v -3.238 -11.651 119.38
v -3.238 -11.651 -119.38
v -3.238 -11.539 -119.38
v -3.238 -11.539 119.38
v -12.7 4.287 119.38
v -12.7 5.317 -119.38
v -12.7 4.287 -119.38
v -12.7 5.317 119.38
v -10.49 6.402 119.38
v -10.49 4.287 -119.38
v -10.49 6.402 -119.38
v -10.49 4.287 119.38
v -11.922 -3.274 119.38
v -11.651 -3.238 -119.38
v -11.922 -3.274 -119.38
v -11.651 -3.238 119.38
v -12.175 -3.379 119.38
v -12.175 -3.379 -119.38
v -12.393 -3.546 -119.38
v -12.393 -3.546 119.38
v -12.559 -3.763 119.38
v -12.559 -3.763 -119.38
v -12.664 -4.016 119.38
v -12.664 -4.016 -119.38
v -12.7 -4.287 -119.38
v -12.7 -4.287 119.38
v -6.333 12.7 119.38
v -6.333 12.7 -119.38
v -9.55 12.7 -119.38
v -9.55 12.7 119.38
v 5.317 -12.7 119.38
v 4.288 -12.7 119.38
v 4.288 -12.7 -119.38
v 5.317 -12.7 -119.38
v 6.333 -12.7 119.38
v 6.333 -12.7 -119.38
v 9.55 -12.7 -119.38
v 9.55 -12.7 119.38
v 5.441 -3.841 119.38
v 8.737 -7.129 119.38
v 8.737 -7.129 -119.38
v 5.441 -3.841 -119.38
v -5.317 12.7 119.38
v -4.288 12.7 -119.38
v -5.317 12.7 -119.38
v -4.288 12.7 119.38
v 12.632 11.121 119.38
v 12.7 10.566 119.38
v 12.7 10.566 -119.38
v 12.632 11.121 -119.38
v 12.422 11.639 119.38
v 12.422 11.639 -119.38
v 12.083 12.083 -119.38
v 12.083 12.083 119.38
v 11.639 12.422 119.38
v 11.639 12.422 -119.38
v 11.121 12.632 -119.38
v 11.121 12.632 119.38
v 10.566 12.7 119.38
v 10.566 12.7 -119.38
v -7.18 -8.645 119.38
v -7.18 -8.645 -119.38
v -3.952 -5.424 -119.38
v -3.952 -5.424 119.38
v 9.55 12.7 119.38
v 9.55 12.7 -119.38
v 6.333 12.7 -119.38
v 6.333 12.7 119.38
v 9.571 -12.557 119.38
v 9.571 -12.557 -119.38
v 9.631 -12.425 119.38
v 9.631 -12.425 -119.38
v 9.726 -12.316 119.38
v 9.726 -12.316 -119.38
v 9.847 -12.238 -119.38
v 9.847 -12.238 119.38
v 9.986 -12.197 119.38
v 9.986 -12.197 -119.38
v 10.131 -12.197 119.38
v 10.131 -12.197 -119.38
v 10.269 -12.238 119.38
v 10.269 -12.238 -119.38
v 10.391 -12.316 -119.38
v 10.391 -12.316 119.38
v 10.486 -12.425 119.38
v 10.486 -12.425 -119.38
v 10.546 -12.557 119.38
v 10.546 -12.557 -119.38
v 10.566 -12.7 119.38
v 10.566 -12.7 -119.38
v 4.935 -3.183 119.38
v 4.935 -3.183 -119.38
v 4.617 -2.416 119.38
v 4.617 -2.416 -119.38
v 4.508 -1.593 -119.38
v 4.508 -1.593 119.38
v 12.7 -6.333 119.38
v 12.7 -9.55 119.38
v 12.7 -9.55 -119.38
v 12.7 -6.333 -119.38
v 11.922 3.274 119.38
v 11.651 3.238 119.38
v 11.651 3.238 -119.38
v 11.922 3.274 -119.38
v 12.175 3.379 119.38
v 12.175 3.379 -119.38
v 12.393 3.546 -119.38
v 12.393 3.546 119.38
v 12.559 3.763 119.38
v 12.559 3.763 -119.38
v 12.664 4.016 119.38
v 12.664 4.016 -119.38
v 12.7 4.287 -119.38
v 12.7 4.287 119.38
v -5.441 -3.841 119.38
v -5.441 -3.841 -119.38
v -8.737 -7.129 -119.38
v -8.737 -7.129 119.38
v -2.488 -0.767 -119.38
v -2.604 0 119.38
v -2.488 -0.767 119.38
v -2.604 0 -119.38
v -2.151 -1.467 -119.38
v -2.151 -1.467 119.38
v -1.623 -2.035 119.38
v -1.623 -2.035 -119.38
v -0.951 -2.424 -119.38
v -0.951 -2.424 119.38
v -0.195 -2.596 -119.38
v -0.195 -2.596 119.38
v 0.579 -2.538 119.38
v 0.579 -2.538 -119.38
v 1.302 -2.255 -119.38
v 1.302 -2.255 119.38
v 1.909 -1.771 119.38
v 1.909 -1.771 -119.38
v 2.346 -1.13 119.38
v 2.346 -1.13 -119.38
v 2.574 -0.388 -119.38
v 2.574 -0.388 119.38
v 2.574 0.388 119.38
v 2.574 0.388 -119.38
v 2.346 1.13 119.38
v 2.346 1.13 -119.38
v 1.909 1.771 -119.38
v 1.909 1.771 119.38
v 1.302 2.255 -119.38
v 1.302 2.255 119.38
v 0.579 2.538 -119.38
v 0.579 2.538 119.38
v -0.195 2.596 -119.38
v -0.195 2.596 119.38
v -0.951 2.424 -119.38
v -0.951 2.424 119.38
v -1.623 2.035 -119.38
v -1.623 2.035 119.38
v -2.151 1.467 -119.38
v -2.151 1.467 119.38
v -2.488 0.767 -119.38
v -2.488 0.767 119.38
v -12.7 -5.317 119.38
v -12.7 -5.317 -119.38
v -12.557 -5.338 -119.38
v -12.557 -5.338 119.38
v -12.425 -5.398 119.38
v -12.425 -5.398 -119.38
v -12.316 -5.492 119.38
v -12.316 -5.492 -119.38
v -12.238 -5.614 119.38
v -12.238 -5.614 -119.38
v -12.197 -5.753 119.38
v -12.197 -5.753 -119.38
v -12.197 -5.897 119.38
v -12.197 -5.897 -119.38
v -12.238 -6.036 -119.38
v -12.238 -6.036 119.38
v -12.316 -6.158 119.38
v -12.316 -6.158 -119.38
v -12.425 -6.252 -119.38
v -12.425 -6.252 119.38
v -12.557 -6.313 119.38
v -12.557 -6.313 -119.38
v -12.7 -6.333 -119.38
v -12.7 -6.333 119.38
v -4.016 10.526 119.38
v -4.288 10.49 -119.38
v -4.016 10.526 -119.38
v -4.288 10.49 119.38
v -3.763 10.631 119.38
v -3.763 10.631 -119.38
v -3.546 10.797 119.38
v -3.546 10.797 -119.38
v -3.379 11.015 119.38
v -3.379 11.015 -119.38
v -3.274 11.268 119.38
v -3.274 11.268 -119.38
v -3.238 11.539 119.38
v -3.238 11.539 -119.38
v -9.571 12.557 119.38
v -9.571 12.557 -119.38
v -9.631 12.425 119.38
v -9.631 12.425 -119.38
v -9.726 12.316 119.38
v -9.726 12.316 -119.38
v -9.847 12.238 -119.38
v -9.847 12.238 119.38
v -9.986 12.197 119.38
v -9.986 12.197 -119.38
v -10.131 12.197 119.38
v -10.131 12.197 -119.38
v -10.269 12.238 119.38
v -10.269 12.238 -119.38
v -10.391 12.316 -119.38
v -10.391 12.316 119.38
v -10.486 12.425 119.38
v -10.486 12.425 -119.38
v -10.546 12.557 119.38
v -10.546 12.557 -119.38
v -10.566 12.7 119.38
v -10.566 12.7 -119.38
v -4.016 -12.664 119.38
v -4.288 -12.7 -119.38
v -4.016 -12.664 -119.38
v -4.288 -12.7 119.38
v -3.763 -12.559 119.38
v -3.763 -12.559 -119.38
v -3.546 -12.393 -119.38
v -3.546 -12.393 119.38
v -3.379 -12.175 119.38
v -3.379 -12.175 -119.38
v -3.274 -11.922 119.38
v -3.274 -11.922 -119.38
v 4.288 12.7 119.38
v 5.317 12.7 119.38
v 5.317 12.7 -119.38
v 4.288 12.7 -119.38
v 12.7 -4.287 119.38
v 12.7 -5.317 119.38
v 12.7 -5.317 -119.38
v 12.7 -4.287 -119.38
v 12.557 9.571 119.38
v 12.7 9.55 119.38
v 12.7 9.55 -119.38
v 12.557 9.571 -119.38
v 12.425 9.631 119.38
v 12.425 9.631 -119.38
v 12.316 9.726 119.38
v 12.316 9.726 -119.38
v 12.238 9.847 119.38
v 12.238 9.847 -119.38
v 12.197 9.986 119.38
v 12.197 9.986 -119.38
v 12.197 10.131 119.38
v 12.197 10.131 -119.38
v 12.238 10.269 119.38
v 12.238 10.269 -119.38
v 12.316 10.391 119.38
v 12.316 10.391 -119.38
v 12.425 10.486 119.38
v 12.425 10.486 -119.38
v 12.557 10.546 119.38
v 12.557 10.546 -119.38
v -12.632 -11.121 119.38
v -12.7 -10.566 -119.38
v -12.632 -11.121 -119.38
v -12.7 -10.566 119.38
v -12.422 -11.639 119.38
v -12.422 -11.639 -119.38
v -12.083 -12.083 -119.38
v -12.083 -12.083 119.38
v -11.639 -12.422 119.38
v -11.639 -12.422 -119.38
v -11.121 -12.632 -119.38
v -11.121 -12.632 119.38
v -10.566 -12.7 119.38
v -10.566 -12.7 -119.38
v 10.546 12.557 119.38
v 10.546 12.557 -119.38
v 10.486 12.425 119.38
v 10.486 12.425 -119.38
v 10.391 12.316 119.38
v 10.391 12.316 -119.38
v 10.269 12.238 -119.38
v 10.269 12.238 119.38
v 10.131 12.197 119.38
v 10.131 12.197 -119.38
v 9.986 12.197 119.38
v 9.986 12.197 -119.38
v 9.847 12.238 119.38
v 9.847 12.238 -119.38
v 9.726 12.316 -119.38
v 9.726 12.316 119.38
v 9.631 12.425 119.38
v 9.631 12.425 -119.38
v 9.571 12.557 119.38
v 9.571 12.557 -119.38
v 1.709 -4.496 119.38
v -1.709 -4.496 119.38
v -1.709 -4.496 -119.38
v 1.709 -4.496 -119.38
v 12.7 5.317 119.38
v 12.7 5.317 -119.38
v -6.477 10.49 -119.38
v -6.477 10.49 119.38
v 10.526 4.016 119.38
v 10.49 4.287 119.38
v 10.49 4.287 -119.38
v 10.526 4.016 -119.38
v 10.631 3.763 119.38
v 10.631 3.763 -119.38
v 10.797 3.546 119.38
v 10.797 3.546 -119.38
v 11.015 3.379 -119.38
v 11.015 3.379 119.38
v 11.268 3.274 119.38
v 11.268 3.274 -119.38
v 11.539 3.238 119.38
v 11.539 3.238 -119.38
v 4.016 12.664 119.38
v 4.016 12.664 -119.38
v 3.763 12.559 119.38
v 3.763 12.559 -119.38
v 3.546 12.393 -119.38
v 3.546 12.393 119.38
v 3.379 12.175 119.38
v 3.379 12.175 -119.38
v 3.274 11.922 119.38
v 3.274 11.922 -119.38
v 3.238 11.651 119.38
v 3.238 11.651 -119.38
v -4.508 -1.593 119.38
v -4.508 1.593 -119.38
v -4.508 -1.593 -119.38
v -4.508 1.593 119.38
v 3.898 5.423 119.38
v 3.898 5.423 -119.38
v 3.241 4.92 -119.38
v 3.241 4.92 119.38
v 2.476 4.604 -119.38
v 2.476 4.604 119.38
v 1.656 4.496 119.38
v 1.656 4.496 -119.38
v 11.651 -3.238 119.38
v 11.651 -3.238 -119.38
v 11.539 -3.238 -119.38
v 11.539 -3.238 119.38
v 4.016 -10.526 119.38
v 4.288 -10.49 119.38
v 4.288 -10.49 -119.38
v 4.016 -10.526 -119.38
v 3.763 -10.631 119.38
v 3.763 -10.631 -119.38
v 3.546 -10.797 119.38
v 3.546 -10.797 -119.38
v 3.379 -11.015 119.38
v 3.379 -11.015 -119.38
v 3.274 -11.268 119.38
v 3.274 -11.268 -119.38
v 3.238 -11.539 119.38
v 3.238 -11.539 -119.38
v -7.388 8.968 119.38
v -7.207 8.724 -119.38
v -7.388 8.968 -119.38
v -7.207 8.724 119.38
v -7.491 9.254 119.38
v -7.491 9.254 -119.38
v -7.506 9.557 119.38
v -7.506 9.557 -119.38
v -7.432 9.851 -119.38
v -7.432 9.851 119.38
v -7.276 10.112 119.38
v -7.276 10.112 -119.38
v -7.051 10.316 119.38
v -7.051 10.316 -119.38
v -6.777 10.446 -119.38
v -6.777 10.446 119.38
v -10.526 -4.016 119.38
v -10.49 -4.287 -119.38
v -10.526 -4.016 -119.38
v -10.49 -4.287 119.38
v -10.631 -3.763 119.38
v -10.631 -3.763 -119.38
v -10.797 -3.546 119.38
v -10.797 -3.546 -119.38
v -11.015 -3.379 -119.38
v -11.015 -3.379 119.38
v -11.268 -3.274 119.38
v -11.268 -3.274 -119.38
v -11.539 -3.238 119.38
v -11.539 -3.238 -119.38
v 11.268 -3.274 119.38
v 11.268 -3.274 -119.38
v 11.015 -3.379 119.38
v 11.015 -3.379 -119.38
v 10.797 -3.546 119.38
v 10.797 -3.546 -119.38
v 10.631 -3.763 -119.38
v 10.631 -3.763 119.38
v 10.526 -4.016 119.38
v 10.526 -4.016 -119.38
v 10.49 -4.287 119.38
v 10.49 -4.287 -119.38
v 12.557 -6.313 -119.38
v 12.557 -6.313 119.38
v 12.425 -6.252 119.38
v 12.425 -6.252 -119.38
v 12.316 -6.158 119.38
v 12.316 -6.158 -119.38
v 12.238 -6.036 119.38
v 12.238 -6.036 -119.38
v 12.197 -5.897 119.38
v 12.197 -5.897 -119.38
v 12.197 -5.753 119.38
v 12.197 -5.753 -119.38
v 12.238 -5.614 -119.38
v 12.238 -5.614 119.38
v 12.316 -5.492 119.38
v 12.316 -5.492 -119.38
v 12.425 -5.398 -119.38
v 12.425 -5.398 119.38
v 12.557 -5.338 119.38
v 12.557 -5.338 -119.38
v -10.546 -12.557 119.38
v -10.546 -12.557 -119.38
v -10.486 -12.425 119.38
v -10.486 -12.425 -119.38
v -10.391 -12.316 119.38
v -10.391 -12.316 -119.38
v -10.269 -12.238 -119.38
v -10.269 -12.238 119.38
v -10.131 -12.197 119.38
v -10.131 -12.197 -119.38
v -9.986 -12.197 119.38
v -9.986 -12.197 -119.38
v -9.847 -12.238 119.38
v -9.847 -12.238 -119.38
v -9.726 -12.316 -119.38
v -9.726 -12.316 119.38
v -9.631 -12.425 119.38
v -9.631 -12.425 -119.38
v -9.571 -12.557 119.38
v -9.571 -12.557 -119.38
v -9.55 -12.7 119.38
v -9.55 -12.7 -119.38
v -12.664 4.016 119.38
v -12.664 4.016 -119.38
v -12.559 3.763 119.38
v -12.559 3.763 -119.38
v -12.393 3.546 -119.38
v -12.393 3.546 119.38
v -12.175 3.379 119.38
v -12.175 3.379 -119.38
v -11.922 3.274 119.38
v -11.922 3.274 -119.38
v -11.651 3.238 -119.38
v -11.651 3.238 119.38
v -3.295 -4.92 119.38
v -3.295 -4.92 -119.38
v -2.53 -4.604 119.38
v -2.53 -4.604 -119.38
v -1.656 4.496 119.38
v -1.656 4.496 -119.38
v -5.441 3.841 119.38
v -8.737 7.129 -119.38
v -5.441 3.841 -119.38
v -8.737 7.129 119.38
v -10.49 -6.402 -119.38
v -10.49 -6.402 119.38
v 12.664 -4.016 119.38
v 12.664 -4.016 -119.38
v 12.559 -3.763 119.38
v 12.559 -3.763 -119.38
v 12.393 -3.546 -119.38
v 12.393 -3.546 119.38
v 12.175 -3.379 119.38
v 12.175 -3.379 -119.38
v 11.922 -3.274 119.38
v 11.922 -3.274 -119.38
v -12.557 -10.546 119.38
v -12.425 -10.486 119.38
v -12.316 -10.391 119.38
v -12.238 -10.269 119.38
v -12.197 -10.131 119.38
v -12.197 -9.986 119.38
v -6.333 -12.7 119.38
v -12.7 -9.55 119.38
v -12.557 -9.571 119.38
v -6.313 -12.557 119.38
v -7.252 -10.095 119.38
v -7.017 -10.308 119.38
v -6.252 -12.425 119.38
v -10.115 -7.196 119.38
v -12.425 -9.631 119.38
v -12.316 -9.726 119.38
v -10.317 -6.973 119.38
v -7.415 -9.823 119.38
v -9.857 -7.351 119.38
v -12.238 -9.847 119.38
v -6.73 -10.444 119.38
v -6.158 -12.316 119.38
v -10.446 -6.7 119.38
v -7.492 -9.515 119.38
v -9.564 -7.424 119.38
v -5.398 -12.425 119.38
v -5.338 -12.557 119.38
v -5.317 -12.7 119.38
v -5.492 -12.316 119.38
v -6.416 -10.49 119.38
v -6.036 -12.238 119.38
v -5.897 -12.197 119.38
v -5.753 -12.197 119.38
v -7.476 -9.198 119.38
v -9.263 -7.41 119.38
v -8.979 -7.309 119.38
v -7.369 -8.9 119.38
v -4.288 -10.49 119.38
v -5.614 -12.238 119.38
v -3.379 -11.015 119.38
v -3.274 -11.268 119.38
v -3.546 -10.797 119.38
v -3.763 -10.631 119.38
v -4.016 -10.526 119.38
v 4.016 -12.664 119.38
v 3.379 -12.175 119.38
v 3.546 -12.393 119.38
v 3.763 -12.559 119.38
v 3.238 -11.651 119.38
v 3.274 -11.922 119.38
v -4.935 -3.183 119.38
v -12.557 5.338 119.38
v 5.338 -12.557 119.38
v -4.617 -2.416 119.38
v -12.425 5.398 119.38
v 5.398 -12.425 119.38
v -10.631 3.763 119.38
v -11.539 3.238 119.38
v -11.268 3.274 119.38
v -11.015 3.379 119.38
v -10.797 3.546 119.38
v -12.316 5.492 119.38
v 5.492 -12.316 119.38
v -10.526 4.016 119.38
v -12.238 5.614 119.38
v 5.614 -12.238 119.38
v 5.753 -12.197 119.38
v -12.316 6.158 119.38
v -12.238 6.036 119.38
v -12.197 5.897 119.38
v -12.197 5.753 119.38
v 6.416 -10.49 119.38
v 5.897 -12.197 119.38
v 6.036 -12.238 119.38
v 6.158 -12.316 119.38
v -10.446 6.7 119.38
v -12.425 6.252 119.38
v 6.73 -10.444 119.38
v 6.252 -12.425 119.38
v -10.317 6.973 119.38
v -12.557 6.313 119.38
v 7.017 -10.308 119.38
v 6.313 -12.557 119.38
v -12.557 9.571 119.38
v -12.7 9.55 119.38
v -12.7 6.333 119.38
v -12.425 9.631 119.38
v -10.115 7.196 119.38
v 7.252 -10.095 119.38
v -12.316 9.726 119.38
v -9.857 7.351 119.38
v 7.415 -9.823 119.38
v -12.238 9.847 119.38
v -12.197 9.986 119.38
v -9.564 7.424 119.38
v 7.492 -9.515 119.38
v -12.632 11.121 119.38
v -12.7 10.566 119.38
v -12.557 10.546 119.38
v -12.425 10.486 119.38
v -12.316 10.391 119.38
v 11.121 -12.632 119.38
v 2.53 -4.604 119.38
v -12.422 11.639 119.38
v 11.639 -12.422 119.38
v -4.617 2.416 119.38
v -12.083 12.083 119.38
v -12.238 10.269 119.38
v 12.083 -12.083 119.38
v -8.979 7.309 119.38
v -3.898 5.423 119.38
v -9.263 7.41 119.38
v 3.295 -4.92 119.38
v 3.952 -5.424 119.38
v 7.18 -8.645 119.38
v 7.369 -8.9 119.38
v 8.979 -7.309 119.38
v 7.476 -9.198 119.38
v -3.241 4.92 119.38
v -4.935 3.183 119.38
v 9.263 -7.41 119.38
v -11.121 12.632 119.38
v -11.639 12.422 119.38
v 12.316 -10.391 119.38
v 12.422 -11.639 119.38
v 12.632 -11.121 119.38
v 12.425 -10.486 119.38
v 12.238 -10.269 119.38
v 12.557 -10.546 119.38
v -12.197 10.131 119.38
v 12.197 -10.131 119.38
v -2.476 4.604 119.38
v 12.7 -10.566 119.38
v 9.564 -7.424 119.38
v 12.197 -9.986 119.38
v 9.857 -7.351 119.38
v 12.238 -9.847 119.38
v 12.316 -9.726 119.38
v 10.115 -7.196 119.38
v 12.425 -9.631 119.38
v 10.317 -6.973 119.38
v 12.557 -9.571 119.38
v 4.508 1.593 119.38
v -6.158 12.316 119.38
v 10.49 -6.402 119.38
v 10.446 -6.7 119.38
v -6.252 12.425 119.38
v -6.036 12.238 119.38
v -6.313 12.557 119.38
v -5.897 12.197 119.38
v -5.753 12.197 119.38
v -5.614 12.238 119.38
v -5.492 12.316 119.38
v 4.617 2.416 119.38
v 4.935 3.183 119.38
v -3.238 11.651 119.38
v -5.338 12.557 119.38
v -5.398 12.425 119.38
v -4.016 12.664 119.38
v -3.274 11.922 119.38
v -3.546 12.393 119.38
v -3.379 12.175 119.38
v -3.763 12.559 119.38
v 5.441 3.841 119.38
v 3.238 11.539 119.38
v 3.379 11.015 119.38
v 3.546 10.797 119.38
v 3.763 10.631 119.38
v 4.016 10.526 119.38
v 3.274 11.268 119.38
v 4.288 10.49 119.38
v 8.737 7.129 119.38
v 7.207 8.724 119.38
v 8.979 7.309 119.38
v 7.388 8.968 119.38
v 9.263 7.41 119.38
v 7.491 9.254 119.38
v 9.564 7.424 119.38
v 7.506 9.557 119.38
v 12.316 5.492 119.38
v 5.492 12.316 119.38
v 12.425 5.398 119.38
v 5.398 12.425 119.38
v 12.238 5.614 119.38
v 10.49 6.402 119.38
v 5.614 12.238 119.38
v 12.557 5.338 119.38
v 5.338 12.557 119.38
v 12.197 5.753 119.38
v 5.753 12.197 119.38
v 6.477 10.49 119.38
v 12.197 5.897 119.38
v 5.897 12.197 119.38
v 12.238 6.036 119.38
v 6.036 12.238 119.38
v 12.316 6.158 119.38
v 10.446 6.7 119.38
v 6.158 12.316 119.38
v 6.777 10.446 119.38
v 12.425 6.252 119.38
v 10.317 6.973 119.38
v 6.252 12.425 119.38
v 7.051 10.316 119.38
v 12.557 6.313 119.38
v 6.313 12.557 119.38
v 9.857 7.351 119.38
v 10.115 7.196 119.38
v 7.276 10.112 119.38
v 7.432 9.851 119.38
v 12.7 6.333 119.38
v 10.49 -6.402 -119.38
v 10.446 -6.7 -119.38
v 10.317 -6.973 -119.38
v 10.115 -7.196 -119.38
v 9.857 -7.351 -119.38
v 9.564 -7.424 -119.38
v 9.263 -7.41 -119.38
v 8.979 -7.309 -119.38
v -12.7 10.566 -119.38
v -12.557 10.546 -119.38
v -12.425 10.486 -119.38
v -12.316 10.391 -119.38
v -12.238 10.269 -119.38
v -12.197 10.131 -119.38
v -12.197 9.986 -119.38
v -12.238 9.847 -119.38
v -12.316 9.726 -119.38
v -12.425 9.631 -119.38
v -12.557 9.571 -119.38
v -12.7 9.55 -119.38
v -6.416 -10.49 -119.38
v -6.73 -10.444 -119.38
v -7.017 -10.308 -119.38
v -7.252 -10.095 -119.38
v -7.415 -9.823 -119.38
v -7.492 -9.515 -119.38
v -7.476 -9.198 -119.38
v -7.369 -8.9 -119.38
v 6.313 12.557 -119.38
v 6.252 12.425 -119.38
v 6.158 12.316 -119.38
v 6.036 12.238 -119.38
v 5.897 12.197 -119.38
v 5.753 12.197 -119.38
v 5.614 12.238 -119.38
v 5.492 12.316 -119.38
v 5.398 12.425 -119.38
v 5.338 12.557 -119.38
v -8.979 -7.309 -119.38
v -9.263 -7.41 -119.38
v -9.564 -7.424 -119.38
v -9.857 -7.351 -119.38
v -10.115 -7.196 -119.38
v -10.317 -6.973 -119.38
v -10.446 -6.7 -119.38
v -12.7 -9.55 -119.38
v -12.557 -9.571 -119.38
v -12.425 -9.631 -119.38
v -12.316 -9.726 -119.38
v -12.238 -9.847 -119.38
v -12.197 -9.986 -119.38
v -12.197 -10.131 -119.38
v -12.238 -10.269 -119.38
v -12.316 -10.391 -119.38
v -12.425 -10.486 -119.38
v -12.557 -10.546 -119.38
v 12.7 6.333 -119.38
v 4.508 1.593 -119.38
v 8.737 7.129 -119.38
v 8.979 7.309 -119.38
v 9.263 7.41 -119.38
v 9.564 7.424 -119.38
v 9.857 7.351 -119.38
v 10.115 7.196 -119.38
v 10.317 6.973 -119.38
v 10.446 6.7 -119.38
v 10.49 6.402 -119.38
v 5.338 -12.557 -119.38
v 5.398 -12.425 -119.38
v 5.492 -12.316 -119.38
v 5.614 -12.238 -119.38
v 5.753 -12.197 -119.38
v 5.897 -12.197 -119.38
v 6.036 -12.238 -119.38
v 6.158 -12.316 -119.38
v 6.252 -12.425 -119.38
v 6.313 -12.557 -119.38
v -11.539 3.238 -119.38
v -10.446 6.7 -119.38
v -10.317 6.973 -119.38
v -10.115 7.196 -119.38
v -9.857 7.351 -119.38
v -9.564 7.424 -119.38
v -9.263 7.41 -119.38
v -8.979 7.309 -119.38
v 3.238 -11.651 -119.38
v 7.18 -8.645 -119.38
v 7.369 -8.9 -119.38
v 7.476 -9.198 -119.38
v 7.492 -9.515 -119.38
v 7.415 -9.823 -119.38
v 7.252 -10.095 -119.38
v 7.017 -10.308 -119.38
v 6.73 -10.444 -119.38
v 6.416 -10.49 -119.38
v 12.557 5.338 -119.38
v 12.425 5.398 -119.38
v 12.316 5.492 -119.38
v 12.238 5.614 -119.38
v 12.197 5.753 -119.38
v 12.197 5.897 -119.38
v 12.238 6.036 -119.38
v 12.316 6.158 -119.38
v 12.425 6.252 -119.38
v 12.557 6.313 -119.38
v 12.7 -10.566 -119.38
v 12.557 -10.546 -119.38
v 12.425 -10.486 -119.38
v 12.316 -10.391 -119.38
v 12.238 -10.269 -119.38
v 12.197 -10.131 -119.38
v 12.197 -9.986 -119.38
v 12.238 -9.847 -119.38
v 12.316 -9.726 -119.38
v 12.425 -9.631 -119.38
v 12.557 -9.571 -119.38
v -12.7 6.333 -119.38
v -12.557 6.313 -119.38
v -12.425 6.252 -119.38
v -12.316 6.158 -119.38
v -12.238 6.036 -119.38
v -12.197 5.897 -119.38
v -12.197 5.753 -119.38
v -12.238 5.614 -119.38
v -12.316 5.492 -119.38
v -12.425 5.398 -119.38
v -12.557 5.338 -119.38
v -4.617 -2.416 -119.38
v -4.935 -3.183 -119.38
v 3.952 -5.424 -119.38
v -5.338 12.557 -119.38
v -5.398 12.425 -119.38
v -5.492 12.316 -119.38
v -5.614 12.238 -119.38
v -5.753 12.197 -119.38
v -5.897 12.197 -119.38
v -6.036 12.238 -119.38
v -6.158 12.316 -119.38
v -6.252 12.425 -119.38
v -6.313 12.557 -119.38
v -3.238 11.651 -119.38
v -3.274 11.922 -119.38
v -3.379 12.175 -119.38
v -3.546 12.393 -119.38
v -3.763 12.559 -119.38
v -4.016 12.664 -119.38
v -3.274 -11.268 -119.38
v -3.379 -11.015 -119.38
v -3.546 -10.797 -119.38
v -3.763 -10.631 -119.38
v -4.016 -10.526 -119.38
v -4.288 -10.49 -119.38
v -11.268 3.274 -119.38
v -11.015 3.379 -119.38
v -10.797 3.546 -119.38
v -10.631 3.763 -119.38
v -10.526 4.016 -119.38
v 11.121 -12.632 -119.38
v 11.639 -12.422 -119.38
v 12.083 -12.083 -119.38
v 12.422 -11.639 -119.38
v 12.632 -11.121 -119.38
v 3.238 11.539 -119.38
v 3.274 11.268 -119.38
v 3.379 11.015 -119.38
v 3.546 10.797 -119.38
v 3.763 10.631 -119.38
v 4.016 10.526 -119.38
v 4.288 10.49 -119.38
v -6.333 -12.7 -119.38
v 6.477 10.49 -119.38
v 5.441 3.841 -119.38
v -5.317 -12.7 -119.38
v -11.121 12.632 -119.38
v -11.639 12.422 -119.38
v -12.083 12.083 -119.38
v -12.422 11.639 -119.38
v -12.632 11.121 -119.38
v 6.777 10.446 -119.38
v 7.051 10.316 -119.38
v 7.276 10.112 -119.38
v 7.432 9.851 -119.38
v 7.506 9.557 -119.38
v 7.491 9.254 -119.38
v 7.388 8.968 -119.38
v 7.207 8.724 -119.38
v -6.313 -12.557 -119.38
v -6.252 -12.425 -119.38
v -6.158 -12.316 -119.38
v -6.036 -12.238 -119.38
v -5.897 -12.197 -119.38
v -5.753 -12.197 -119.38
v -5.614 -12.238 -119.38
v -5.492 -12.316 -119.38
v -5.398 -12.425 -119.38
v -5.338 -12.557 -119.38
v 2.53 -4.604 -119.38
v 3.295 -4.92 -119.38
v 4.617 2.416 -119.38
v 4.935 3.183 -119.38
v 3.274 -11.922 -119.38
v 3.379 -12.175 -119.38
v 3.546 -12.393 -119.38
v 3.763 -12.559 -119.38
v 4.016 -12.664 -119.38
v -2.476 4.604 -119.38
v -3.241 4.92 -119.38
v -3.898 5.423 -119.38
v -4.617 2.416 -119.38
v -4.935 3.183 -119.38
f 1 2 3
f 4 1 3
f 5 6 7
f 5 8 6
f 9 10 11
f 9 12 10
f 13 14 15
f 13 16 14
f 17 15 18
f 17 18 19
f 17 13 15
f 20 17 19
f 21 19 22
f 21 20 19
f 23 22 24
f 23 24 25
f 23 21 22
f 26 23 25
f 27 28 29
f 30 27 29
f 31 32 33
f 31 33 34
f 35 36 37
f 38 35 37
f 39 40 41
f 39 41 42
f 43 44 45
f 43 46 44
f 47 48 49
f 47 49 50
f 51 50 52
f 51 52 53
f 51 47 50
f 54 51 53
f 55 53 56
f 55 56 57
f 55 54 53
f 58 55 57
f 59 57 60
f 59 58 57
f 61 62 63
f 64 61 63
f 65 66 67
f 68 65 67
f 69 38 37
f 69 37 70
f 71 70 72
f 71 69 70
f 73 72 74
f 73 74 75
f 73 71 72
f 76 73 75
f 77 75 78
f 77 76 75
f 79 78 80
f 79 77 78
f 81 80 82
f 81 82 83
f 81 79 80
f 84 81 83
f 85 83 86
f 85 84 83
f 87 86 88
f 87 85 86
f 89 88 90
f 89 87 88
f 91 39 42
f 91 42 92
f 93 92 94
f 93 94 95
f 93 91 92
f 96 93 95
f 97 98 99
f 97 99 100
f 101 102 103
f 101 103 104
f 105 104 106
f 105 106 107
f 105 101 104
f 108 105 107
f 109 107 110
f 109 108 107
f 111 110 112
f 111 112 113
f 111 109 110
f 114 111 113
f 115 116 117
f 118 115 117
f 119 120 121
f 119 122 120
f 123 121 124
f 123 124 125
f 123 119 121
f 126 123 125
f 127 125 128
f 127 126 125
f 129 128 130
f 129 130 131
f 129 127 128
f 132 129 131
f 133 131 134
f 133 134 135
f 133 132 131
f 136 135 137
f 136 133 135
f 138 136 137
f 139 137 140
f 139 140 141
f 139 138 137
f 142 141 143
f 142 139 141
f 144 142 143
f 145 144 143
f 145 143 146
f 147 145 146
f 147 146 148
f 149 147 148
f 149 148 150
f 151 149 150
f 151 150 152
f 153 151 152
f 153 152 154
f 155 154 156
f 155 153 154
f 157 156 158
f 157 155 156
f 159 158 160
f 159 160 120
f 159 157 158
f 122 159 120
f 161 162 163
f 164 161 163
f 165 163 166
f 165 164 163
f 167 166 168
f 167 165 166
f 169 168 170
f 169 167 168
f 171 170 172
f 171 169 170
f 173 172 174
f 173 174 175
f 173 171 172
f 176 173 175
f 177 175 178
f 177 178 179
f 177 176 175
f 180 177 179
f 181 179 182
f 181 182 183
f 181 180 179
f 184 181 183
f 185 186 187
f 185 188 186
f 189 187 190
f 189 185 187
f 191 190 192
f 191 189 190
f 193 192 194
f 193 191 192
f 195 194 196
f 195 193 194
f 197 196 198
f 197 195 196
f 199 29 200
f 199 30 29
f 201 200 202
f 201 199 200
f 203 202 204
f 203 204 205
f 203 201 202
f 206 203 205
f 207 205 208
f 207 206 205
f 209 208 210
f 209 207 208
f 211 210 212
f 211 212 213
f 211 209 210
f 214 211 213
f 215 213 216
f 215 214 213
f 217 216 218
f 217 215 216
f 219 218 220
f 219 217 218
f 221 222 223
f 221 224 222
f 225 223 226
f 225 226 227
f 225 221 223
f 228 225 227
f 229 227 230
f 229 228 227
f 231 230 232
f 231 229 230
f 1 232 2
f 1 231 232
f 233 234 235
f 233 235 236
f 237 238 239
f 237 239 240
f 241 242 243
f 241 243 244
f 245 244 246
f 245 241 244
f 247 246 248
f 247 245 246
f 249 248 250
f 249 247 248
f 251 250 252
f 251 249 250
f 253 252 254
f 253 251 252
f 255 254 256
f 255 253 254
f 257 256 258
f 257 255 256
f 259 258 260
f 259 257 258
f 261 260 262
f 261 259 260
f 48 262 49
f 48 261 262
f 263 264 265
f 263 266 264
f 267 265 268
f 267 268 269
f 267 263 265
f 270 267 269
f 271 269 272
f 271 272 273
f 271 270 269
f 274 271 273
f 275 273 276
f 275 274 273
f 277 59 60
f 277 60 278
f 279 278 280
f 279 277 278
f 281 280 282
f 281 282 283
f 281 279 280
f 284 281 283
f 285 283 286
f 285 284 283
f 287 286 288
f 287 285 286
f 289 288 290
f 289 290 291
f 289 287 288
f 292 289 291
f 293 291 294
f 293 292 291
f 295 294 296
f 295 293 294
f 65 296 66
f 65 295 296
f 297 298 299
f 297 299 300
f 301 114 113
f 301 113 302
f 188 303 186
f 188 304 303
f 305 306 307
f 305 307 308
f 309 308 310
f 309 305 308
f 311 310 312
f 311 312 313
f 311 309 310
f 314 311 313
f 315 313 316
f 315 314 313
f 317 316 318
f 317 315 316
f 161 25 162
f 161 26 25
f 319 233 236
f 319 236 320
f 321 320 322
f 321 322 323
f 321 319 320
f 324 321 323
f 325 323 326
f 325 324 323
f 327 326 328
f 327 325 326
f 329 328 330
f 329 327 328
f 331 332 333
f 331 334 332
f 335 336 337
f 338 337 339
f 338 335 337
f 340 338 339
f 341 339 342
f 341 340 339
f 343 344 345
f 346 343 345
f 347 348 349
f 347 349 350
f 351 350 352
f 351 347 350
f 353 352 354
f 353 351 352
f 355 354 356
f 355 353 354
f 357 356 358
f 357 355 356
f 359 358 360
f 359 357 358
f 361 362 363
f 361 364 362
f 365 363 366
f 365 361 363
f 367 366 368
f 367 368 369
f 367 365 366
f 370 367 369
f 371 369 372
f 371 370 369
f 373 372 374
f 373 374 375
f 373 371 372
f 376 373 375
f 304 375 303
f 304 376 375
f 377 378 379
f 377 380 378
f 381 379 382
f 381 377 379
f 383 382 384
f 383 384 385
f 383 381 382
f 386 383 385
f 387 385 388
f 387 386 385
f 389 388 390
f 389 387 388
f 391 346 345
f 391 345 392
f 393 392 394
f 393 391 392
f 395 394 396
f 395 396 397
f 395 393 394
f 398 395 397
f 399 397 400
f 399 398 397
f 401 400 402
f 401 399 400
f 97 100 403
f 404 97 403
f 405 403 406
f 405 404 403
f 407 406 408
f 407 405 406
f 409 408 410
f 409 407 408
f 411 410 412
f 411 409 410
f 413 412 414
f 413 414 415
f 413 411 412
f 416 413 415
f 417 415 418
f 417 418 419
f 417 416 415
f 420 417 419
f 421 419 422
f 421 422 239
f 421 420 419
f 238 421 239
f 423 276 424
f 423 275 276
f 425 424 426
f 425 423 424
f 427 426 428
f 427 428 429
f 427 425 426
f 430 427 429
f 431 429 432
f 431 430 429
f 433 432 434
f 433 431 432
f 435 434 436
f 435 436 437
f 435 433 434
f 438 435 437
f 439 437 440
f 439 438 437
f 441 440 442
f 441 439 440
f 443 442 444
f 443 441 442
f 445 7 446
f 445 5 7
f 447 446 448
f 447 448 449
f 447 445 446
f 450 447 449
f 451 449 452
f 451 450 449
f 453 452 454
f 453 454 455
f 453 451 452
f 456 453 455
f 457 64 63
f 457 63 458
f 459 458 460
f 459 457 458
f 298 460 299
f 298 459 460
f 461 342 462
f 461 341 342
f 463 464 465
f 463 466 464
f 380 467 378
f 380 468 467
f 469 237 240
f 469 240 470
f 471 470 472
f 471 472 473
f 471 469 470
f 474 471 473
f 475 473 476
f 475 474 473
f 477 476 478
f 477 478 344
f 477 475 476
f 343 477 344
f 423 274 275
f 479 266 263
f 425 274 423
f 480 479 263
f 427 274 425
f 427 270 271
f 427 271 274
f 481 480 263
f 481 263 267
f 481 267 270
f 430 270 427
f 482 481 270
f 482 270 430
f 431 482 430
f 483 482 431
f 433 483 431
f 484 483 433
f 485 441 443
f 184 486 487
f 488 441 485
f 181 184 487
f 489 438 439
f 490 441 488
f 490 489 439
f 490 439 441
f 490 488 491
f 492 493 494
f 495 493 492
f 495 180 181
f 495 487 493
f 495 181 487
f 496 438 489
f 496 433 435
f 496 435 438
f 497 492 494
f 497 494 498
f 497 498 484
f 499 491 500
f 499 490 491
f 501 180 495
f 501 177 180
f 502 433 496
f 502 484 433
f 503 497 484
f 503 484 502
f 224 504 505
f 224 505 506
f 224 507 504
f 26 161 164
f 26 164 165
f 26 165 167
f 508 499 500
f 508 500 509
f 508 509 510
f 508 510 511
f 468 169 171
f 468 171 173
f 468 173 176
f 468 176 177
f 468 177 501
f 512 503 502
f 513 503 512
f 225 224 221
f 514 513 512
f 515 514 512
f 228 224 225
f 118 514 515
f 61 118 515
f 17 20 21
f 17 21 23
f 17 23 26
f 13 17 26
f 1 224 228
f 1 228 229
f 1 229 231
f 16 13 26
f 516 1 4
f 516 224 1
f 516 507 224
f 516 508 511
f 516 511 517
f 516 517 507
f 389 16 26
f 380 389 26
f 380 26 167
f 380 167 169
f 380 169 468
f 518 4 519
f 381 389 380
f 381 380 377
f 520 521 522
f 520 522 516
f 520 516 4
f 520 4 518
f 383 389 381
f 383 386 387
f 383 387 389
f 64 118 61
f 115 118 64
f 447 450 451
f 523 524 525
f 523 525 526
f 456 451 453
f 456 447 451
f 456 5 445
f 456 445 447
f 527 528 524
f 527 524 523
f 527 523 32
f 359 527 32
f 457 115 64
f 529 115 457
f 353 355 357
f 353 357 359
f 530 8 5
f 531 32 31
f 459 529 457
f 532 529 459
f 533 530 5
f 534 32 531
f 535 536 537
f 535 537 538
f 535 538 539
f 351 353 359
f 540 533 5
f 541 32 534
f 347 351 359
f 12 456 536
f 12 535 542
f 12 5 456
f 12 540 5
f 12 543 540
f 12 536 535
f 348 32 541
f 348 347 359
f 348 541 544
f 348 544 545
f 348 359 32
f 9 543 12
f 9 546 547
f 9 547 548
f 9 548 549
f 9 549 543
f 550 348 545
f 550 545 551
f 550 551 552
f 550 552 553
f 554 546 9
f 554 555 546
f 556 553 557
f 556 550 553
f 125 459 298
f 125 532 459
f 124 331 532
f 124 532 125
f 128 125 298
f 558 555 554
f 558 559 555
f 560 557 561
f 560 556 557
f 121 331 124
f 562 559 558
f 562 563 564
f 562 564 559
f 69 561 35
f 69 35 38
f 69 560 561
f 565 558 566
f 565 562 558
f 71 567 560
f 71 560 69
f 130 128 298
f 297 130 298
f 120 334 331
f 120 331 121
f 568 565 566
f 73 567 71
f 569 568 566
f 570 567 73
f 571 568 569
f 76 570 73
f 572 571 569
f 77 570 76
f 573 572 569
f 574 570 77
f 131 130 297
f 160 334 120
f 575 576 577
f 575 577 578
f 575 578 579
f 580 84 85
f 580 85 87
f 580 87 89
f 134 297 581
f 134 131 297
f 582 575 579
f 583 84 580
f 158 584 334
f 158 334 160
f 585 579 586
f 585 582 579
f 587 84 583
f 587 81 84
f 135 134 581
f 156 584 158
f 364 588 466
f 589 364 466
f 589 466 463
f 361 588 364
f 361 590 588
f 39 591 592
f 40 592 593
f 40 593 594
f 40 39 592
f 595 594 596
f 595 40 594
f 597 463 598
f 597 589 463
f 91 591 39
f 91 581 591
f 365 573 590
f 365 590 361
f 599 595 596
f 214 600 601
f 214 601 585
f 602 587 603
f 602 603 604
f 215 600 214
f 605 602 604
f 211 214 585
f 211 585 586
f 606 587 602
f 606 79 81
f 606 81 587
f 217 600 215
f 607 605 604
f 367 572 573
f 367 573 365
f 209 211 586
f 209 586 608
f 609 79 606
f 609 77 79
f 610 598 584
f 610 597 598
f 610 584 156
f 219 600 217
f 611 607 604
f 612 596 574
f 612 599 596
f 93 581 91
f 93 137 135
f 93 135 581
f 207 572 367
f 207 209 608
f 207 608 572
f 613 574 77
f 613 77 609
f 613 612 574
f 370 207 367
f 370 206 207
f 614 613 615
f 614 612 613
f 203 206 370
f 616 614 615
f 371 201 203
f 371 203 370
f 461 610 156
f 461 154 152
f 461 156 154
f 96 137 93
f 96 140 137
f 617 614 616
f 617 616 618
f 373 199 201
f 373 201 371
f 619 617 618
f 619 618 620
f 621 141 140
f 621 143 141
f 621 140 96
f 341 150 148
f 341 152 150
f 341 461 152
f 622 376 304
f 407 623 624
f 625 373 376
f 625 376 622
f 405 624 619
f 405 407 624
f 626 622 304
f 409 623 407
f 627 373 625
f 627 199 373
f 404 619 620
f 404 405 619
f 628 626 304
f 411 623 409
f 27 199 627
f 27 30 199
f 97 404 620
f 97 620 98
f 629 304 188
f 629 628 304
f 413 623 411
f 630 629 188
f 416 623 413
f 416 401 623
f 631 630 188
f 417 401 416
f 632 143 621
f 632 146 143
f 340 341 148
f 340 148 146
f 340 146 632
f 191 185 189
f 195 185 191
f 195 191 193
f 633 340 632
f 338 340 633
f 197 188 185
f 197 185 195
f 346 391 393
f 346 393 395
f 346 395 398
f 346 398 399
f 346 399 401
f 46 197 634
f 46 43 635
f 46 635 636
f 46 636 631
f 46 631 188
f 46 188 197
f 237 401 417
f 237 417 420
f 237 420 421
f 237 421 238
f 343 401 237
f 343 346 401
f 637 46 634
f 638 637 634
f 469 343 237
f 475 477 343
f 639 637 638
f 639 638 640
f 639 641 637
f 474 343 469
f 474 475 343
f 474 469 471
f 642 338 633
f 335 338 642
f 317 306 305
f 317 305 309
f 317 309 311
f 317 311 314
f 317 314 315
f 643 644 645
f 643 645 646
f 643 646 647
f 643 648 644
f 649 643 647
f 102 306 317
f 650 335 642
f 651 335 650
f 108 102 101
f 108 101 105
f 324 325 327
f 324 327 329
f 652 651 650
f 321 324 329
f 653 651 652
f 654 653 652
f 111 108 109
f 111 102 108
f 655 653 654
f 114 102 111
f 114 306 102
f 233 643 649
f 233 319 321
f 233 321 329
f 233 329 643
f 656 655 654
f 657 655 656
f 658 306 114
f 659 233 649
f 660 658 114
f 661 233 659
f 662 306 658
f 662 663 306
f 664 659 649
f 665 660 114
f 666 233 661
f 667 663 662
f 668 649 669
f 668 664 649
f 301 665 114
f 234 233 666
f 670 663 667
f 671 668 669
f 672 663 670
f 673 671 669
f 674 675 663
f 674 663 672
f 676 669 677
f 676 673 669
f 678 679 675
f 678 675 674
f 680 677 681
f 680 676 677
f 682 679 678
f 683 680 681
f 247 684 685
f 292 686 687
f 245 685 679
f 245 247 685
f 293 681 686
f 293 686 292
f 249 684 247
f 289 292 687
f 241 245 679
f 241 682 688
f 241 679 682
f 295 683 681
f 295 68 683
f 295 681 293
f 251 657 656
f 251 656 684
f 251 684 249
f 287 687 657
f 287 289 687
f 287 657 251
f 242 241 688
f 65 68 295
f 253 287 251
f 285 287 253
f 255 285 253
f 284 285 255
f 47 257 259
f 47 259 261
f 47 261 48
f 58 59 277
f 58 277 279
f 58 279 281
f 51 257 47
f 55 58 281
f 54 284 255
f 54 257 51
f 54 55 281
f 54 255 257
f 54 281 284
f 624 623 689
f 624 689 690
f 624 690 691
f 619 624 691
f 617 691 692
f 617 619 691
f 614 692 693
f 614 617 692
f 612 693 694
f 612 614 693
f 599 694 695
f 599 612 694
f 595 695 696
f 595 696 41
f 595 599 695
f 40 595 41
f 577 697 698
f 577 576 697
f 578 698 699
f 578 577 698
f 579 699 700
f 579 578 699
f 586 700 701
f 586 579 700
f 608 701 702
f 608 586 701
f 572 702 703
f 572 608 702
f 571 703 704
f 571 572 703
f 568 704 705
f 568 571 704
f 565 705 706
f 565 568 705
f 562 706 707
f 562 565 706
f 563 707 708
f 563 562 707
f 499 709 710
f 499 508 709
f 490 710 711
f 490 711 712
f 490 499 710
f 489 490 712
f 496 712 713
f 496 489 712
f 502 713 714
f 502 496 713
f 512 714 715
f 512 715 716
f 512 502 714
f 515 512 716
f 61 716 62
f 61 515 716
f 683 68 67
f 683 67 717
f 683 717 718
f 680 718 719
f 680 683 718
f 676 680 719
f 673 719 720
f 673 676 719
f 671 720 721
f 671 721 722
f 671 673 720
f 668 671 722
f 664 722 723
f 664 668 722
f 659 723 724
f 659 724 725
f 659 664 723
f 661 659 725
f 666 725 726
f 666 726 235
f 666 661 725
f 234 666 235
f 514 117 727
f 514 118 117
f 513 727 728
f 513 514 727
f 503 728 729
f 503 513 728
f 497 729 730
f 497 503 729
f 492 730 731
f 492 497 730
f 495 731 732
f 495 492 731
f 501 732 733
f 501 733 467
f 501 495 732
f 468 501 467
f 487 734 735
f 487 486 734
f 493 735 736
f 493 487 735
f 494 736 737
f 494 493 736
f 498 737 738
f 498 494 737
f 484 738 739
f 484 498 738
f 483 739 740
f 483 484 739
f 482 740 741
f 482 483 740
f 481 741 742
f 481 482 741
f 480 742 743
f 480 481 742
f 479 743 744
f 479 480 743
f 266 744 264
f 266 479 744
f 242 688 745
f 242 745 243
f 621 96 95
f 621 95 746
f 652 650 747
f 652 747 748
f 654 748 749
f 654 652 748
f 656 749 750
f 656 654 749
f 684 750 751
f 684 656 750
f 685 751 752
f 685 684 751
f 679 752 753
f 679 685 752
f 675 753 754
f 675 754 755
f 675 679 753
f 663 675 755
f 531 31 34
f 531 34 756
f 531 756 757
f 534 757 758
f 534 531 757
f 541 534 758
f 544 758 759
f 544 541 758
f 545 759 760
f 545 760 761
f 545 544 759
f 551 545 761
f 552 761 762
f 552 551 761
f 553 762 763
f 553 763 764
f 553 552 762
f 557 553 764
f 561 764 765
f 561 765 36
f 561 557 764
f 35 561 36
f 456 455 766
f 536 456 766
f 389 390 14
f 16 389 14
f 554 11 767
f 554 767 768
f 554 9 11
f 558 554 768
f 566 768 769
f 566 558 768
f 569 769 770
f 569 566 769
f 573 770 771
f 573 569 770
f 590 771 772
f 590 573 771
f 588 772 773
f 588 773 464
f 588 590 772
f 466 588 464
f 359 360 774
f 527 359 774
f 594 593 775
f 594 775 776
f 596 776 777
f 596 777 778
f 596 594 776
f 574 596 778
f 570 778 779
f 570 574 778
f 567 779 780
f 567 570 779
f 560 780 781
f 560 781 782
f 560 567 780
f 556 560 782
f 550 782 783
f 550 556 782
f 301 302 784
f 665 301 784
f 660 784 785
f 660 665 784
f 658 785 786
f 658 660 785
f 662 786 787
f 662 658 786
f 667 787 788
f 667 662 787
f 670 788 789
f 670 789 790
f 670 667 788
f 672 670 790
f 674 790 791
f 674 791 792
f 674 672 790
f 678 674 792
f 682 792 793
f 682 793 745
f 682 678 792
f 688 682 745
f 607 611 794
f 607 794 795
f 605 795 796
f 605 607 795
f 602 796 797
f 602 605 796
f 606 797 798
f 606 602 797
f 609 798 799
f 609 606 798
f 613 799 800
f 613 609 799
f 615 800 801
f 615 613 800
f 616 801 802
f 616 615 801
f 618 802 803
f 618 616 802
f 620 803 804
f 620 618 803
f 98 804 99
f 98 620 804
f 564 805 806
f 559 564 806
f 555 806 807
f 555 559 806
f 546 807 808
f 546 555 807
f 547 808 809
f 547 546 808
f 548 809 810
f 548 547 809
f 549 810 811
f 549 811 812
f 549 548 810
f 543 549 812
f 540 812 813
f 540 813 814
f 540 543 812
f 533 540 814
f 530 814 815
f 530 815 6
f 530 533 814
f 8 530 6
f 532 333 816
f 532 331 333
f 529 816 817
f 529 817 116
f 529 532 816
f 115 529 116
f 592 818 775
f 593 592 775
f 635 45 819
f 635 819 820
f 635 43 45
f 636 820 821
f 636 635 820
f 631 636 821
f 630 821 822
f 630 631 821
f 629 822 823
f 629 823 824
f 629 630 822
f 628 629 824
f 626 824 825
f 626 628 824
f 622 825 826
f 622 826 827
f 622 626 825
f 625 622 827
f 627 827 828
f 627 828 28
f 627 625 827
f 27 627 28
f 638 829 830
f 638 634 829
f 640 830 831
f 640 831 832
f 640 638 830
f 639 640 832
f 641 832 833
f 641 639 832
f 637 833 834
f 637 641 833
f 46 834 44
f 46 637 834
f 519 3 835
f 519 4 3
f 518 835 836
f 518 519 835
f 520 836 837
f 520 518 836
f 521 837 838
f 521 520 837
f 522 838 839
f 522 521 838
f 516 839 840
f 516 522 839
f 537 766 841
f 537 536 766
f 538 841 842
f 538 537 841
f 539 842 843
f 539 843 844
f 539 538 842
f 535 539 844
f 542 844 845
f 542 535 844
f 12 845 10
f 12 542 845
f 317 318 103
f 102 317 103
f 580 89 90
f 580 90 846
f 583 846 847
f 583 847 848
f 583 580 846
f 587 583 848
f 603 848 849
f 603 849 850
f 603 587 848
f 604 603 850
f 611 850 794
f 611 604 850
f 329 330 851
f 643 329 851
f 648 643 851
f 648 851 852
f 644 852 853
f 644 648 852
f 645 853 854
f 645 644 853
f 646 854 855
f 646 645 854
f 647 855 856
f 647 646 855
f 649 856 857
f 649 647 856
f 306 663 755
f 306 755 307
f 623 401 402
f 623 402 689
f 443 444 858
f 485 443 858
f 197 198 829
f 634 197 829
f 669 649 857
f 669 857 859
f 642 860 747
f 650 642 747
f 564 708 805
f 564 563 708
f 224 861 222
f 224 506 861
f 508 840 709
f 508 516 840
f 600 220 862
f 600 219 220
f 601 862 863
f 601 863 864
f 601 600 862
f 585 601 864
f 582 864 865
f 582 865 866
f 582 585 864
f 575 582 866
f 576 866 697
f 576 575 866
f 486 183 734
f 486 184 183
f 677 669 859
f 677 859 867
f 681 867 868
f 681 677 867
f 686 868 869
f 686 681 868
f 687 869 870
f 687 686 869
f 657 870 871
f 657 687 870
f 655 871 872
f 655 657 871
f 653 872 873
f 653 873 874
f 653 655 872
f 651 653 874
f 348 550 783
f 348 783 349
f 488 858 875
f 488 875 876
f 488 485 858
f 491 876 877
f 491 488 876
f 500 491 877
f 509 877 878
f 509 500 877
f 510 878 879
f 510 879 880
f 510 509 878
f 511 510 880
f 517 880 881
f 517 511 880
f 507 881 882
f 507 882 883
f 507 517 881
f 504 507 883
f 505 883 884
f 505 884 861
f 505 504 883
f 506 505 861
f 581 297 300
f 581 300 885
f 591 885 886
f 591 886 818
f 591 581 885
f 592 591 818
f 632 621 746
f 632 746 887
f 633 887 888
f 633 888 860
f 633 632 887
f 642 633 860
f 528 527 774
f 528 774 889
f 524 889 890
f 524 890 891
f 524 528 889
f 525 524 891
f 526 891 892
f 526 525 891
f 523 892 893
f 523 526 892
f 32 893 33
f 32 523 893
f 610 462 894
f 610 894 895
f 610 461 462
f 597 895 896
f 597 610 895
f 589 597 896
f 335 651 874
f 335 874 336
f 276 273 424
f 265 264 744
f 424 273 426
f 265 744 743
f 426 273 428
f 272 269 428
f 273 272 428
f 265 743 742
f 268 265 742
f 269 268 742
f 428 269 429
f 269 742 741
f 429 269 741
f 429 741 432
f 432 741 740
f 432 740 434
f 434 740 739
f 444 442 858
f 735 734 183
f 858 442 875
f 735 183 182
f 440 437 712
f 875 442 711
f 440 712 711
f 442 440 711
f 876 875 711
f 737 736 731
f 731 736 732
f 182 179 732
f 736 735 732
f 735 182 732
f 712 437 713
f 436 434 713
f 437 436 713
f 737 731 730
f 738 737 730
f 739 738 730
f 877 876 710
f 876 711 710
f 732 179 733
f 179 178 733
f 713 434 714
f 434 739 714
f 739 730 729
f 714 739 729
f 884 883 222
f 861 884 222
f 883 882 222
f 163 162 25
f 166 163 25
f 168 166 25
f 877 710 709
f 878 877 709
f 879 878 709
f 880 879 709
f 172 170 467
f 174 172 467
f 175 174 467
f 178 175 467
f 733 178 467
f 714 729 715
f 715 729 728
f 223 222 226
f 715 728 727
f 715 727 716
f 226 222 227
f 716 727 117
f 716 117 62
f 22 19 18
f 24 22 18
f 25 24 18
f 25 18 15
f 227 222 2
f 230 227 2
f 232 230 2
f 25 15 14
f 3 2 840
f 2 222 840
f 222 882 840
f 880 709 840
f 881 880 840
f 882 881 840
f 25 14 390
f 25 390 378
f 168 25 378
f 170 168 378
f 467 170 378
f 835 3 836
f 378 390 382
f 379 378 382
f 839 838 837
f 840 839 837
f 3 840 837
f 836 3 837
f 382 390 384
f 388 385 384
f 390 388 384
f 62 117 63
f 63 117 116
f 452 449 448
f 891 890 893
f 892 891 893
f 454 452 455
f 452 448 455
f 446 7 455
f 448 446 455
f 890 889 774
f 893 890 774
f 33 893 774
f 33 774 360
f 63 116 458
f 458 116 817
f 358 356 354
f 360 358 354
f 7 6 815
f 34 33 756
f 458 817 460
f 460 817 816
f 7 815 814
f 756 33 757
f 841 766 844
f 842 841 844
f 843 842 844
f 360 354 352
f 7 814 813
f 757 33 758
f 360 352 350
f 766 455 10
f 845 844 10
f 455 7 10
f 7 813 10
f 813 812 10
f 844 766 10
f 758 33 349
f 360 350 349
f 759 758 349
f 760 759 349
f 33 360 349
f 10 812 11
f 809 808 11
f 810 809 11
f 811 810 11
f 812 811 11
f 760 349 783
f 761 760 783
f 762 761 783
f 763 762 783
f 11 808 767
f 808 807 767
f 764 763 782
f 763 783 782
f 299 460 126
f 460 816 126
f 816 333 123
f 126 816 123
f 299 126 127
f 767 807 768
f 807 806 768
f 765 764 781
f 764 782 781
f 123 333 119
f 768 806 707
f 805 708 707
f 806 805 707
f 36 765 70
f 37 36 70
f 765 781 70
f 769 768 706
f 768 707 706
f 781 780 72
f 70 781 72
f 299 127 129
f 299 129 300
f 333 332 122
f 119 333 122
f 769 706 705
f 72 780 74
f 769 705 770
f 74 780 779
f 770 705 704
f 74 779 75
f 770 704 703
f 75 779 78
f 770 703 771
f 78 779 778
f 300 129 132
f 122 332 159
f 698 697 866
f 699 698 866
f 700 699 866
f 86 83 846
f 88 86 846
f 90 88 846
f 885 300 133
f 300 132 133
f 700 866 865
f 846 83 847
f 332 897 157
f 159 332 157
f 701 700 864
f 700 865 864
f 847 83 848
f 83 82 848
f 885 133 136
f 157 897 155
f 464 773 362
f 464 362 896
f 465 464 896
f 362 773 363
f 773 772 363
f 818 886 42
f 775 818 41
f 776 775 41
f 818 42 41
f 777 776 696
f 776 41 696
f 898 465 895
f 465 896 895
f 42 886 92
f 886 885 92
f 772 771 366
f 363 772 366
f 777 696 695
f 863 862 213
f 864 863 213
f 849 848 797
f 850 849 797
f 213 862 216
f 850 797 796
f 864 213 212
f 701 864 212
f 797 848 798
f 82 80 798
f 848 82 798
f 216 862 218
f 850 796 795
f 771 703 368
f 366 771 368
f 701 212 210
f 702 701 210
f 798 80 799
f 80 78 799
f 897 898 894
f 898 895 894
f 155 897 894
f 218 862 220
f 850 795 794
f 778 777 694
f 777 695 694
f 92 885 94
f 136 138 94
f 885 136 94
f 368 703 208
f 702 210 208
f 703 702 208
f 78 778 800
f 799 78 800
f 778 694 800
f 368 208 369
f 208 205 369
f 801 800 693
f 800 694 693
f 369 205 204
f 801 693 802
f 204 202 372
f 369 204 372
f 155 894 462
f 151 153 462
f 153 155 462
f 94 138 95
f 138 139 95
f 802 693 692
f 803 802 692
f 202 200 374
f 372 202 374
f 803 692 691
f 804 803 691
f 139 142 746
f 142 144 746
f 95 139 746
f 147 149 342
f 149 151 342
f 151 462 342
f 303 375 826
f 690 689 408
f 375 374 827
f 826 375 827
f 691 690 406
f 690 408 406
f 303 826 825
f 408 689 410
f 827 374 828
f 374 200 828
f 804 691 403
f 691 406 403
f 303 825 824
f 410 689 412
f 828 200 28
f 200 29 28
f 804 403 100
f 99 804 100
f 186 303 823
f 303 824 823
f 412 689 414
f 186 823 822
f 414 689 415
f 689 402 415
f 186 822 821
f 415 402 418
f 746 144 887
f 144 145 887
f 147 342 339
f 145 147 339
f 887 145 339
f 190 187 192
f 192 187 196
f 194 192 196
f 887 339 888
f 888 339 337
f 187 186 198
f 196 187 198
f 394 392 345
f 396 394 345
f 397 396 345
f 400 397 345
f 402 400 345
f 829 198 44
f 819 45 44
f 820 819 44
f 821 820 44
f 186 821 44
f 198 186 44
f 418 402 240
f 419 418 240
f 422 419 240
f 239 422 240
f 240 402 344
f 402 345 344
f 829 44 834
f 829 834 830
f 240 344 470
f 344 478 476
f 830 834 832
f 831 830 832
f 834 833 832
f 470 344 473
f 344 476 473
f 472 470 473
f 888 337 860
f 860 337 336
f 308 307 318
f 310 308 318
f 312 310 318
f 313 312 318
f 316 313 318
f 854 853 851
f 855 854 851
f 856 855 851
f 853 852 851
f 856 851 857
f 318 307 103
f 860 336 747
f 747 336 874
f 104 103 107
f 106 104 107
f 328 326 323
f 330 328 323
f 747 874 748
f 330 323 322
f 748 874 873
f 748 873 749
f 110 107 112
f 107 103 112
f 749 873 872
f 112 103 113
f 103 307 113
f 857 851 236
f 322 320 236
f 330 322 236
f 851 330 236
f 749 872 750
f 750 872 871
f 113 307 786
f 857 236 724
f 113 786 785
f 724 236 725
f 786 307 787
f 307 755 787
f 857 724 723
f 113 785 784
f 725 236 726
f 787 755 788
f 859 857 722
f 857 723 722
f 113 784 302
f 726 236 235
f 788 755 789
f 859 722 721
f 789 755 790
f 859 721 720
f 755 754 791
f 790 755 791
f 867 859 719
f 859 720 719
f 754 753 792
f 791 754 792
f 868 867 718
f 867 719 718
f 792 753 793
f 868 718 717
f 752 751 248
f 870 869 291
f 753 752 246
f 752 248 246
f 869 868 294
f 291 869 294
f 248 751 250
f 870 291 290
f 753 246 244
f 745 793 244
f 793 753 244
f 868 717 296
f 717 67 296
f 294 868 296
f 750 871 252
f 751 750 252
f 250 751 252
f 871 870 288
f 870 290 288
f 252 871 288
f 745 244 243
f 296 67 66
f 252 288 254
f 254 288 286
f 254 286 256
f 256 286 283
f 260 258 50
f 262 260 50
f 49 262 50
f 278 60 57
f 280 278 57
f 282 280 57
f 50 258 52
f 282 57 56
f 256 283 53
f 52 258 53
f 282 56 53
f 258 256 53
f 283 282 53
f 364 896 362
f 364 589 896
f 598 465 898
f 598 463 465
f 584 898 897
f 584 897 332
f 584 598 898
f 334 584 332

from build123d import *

# Parameters (mm, degrees)
SKETCH1_R           = 2.6035
BOSS_EXTRUDE1_DEPTH = 119.38


with BuildPart() as part:
    # Sketch1 → Boss-Extrude1 (new, symmetric)
    with BuildSketch(Plane.XY):
        with BuildLine():
            Line((-7.179650497, -8.645192506), (-3.952270251, -5.423690499))
            ThreePointArc((-3.952270251, -5.423690499), (-2.922936451, -4.736929036), (-1.709253557, -4.4958))
            Line((-1.709253557, -4.4958), (1.709253557, -4.4958))
            ThreePointArc((1.709253557, -4.4958), (2.922936451, -4.736929036), (3.952270251, -5.423690499))
            Line((3.952270251, -5.423690499), (7.179650497, -8.645192506))
            ThreePointArc((7.179650497, -8.645192506), (7.41473083, -9.822813117), (6.416408329, -10.4902))
            Line((6.416408329, -10.4902), (4.287512407, -10.4902))
            ThreePointArc((4.287512407, -10.4902), (3.54574862, -10.79744862), (3.2385, -11.539212407))
            Line((3.2385, -11.539212407), (3.2385, -11.650987593))
            ThreePointArc((3.2385, -11.650987593), (3.54574862, -12.39275138), (4.287512407, -12.7))
            Line((4.287512407, -12.7), (5.317126718, -12.7))
            ThreePointArc((5.317126718, -12.7), (5.825126718, -12.192), (6.333126718, -12.7))
            Line((6.333126718, -12.7), (9.550443118, -12.7))
            ThreePointArc((9.550443118, -12.7), (10.058366869, -12.192000006), (10.566443095, -12.699847501))
            ThreePointArc((10.566443095, -12.699847501), (12.082537762, -12.08250727), (12.699846982, -10.566399977))
            ThreePointArc((12.699846982, -10.566399977), (12.192000006, -10.058323491), (12.7, -9.5504))
            Line((12.7, -9.5504), (12.7, -6.3330836))
            ThreePointArc((12.7, -6.3330836), (12.192, -5.8250836), (12.7, -5.3170836))
            Line((12.7, -5.3170836), (12.7, -4.287469289))
            ThreePointArc((12.7, -4.287469289), (12.39275138, -3.545705502), (11.650987593, -3.238456882))
            Line((11.650987593, -3.238456882), (11.539212407, -3.238456882))
            ThreePointArc((11.539212407, -3.238456882), (10.79744862, -3.545705502), (10.4902, -4.287469289))
            Line((10.4902, -4.287469289), (10.4902, -6.402089023))
            ThreePointArc((10.4902, -6.402089023), (9.856505071, -7.351067942), (8.737131347, -7.129408934))
            Line((8.737131347, -7.129408934), (5.441005833, -3.840816462))
            ThreePointArc((5.441005833, -3.840816462), (4.750877967, -2.809883091), (4.5085, -1.593185507))
            Line((4.5085, -1.593185507), (4.5085, 1.593185507))
            ThreePointArc((4.5085, 1.593185507), (4.750877967, 2.809883091), (5.441005833, 3.840816462))
            Line((5.441005833, 3.840816462), (8.737131347, 7.129408934))
            ThreePointArc((8.737131347, 7.129408934), (9.856505071, 7.351067942), (10.4902, 6.402089023))
            Line((10.4902, 6.402089023), (10.4902, 4.287469289))
            ThreePointArc((10.4902, 4.287469289), (10.79744862, 3.545705502), (11.539212407, 3.238456882))
            Line((11.539212407, 3.238456882), (11.650987593, 3.238456882))
            ThreePointArc((11.650987593, 3.238456882), (12.39275138, 3.545705502), (12.7, 4.287469289))
            Line((12.7, 4.287469289), (12.7, 5.3170836))
            ThreePointArc((12.7, 5.3170836), (12.192, 5.8250836), (12.7, 6.3330836))
            Line((12.7, 6.3330836), (12.7, 9.5504))
            ThreePointArc((12.7, 9.5504), (12.192000006, 10.058323491), (12.699846982, 10.566399977))
            ThreePointArc((12.699846982, 10.566399977), (12.082537762, 12.08250727), (10.566443095, 12.699847501))
            ThreePointArc((10.566443095, 12.699847501), (10.058366869, 12.192000006), (9.550443118, 12.7))
            Line((9.550443118, 12.7), (6.333126718, 12.7))
            ThreePointArc((6.333126718, 12.7), (5.825126718, 12.192), (5.317126718, 12.7))
            Line((5.317126718, 12.7), (4.287512407, 12.7))
            ThreePointArc((4.287512407, 12.7), (3.54574862, 12.39275138), (3.2385, 11.650987593))
            Line((3.2385, 11.650987593), (3.2385, 11.539212407))
            ThreePointArc((3.2385, 11.539212407), (3.54574862, 10.79744862), (4.287512407, 10.4902))
            Line((4.287512407, 10.4902), (6.476788598, 10.4902))
            ThreePointArc((6.476788598, 10.4902), (7.432222385, 9.85140422), (7.207036008, 8.724370562))
            Line((7.207036008, 8.724370562), (3.898272566, 5.423169045))
            ThreePointArc((3.898272566, 5.423169045), (2.869120213, 4.736787962), (1.655778399, 4.4958))
            Line((1.655778399, 4.4958), (-1.655778399, 4.4958))
            ThreePointArc((-1.655778399, 4.4958), (-2.869120213, 4.736787962), (-3.898272566, 5.423169045))
            Line((-3.898272566, 5.423169045), (-7.207036008, 8.724370562))
            ThreePointArc((-7.207036008, 8.724370562), (-7.432222385, 9.85140422), (-6.476788598, 10.4902))
            Line((-6.476788598, 10.4902), (-4.287512407, 10.4902))
            ThreePointArc((-4.287512407, 10.4902), (-3.54574862, 10.79744862), (-3.2385, 11.539212407))
            Line((-3.2385, 11.539212407), (-3.2385, 11.650987593))
            ThreePointArc((-3.2385, 11.650987593), (-3.54574862, 12.39275138), (-4.287512407, 12.7))
            Line((-4.287512407, 12.7), (-5.317126718, 12.7))
            ThreePointArc((-5.317126718, 12.7), (-5.825126718, 12.192), (-6.333126718, 12.7))
            Line((-6.333126718, 12.7), (-9.550443118, 12.7))
            ThreePointArc((-9.550443118, 12.7), (-10.058366869, 12.192000006), (-10.566443095, 12.699847501))
            ThreePointArc((-10.566443095, 12.699847501), (-12.082537762, 12.08250727), (-12.699846982, 10.566399977))
            ThreePointArc((-12.699846982, 10.566399977), (-12.192000006, 10.058323491), (-12.7, 9.5504))
            Line((-12.7, 9.5504), (-12.7, 6.3330836))
            ThreePointArc((-12.7, 6.3330836), (-12.192, 5.8250836), (-12.7, 5.3170836))
            Line((-12.7, 5.3170836), (-12.7, 4.287469289))
            ThreePointArc((-12.7, 4.287469289), (-12.39275138, 3.545705502), (-11.650987593, 3.238456882))
            Line((-11.650987593, 3.238456882), (-11.539212407, 3.238456882))
            ThreePointArc((-11.539212407, 3.238456882), (-10.79744862, 3.545705502), (-10.4902, 4.287469289))
            Line((-10.4902, 4.287469289), (-10.4902, 6.402089023))
            ThreePointArc((-10.4902, 6.402089023), (-9.856505071, 7.351067942), (-8.737131347, 7.129408934))
            Line((-8.737131347, 7.129408934), (-5.441005833, 3.840816462))
            ThreePointArc((-5.441005833, 3.840816462), (-4.750877967, 2.809883091), (-4.5085, 1.593185507))
            Line((-4.5085, 1.593185507), (-4.5085, -1.593185507))
            ThreePointArc((-4.5085, -1.593185507), (-4.750877967, -2.809883091), (-5.441005833, -3.840816462))
            Line((-5.441005833, -3.840816462), (-8.737131347, -7.129408934))
            ThreePointArc((-8.737131347, -7.129408934), (-9.856505071, -7.351067942), (-10.4902, -6.402089023))
            Line((-10.4902, -6.402089023), (-10.4902, -4.287469289))
            ThreePointArc((-10.4902, -4.287469289), (-10.79744862, -3.545705502), (-11.539212407, -3.238456882))
            Line((-11.539212407, -3.238456882), (-11.650987593, -3.238456882))
            ThreePointArc((-11.650987593, -3.238456882), (-12.39275138, -3.545705502), (-12.7, -4.287469289))
            Line((-12.7, -4.287469289), (-12.7, -5.3170836))
            ThreePointArc((-12.7, -5.3170836), (-12.192, -5.8250836), (-12.7, -6.3330836))
            Line((-12.7, -6.3330836), (-12.7, -9.5504))
            ThreePointArc((-12.7, -9.5504), (-12.192000006, -10.058323491), (-12.699846982, -10.566399977))
            ThreePointArc((-12.699846982, -10.566399977), (-12.082537762, -12.08250727), (-10.566443095, -12.699847501))
            ThreePointArc((-10.566443095, -12.699847501), (-10.058366869, -12.192000006), (-9.550443118, -12.7))
            Line((-9.550443118, -12.7), (-6.333126718, -12.7))
            ThreePointArc((-6.333126718, -12.7), (-5.825126718, -12.192), (-5.317126718, -12.7))
            Line((-5.317126718, -12.7), (-4.287512407, -12.7))
            ThreePointArc((-4.287512407, -12.7), (-3.54574862, -12.39275138), (-3.2385, -11.650987593))
            Line((-3.2385, -11.650987593), (-3.2385, -11.539212407))
            ThreePointArc((-3.2385, -11.539212407), (-3.54574862, -10.79744862), (-4.287512407, -10.4902))
            Line((-4.287512407, -10.4902), (-6.416408329, -10.4902))
            ThreePointArc((-6.416408329, -10.4902), (-7.41473083, -9.822813117), (-7.179650497, -8.645192506))
        make_face()
        with Locations(Location((0, 0, 0), (0, 0, 180))):
            Circle(SKETCH1_R, mode=Mode.SUBTRACT)
    extrude(amount=BOSS_EXTRUDE1_DEPTH, both=True)


solid = part.part
